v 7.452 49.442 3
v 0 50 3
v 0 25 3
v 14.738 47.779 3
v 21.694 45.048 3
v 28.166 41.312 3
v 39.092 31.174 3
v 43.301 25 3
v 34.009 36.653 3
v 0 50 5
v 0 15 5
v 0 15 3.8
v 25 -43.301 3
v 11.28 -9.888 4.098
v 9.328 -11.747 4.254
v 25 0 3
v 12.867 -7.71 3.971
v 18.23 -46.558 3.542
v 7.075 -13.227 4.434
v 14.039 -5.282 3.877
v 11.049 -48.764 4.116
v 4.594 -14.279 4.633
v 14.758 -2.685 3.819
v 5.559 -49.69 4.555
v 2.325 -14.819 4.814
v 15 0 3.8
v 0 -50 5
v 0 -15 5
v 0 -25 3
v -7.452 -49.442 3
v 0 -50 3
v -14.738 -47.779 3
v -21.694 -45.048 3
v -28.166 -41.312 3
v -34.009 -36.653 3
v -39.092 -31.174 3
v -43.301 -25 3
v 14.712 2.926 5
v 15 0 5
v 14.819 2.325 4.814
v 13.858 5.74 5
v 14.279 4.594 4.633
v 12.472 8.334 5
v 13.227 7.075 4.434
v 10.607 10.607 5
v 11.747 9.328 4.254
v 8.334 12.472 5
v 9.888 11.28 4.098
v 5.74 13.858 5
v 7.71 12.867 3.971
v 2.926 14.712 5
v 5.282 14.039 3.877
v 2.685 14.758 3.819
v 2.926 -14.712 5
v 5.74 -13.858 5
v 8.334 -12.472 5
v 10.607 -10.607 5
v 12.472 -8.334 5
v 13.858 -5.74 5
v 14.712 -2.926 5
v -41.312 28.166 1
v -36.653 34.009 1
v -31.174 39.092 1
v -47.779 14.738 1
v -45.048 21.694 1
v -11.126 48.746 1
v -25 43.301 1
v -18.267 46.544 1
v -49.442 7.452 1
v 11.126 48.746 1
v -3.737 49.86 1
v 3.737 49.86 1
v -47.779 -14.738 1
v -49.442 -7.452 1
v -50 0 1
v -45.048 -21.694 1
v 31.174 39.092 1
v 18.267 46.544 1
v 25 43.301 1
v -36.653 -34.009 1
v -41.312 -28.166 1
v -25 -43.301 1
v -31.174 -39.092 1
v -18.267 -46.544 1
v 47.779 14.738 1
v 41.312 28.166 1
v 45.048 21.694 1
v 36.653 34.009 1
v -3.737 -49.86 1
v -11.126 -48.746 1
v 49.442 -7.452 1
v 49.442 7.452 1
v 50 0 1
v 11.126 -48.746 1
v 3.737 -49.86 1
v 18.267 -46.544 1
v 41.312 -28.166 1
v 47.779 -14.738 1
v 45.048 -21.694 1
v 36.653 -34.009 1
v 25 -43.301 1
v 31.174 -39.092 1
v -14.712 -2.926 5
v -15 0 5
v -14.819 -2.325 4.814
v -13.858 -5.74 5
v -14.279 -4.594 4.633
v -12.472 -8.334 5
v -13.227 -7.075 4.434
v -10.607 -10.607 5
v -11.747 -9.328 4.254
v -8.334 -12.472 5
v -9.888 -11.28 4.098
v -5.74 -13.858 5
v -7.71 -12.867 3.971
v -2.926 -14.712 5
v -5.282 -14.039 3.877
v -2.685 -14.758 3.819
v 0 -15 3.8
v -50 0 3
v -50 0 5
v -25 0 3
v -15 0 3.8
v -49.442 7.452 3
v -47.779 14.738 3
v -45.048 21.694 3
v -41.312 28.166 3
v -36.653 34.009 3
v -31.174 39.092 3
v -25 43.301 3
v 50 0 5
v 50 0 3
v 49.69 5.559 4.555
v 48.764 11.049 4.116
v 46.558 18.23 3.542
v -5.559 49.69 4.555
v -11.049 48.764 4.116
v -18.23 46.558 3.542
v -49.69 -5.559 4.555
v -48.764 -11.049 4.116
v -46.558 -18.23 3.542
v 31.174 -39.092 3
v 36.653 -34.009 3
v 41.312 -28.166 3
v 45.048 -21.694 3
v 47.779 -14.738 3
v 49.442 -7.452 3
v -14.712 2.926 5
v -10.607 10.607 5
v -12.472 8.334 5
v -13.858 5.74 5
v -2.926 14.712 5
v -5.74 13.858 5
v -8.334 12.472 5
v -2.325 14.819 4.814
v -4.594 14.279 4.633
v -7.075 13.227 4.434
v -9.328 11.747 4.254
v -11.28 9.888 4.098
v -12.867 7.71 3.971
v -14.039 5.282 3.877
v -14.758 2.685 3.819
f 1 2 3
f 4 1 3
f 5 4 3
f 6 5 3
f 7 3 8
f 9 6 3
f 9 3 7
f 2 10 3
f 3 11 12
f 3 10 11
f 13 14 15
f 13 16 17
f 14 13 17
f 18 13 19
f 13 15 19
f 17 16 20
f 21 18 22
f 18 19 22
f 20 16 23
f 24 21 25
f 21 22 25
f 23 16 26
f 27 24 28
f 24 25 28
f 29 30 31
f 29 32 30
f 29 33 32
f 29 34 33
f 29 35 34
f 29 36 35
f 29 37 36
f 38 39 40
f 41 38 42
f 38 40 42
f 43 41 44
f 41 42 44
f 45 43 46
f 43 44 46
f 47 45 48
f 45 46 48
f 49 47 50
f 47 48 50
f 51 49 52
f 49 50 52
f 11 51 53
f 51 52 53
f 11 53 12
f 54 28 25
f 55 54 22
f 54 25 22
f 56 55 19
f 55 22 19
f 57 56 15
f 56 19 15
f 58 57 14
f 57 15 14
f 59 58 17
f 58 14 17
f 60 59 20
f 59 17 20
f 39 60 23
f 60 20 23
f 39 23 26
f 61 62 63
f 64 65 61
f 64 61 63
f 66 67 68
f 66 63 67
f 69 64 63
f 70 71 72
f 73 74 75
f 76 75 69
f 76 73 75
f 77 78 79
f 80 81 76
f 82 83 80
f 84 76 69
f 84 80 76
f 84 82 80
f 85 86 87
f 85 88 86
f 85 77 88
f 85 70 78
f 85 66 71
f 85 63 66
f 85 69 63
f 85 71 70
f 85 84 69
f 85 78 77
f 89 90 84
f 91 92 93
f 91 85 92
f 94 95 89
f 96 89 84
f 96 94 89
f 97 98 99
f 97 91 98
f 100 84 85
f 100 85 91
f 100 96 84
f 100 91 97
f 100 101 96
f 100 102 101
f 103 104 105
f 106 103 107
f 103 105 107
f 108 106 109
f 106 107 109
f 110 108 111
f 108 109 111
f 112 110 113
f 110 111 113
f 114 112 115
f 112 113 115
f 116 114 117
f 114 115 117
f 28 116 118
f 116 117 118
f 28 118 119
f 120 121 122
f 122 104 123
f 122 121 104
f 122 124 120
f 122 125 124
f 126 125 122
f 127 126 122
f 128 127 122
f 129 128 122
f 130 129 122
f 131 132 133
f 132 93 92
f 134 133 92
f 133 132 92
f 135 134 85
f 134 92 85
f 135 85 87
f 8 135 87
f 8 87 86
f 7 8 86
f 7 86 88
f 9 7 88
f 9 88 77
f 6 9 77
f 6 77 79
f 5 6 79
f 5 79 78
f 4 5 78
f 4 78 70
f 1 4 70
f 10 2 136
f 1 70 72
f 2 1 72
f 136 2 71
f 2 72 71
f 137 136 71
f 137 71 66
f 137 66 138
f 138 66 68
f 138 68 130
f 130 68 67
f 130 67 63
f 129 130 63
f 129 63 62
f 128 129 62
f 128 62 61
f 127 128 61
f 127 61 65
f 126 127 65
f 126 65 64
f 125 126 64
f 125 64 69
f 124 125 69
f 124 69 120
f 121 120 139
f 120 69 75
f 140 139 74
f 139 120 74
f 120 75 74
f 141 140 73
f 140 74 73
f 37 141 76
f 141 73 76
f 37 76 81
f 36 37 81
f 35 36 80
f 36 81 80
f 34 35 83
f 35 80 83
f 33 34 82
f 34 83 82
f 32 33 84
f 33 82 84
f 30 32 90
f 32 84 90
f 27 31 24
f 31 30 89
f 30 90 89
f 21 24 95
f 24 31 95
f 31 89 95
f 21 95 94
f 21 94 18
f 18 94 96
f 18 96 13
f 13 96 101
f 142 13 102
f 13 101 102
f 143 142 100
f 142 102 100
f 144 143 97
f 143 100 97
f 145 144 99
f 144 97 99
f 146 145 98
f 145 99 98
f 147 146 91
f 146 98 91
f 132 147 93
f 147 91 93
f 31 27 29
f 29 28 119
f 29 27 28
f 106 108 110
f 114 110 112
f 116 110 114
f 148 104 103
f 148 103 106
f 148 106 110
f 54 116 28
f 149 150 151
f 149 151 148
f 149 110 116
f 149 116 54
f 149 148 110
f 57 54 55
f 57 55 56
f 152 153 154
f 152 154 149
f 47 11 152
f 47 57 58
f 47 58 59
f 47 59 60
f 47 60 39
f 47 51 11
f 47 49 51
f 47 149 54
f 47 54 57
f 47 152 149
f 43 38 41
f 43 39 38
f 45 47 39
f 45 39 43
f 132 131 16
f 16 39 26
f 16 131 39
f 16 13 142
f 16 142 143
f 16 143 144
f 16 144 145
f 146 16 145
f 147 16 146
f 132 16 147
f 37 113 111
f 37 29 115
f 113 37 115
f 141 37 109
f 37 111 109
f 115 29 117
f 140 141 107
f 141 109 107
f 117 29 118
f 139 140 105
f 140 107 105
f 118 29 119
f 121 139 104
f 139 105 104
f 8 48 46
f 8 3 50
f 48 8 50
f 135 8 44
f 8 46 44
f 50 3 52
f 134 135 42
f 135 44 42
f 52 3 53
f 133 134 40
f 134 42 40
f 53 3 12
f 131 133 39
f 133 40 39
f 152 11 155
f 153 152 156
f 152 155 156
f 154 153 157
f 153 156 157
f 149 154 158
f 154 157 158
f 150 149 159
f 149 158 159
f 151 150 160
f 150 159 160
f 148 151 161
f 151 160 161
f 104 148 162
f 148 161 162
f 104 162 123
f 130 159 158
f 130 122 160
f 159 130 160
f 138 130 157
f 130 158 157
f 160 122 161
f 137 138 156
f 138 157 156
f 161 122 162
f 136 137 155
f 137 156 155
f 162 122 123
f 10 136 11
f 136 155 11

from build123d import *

# Parameters (mm, degrees)
F0_R          = 50
F0_R_2        = 15
F1_DEPTH      = 3
F2_DEPTH      = 5
F4_DEPTH      = 50
F5_COUNT      = 4
F6_R          = 62.5
F6_R_2        = 50
F7_DEPTH      = 25
F8_W          = 200
F8_H          = 2
F9_DEPTH      = 100
F9_DEPTH_BACK = 100


with BuildPart() as f1:
    # F0 (on Top) → F1 (new body)
    with BuildSketch(Plane.XY):
        Circle(F0_R)
        Circle(F0_R_2, mode=Mode.SUBTRACT)
    extrude(amount=F1_DEPTH)

    # F0 (on Top) → F2 (join)
    with BuildSketch(Plane.XY):
        Circle(F0_R_2)
    extrude(amount=F2_DEPTH)

    # F3 (on Front) → F4 (join)
    with BuildSketch(Plane.XZ):
        Polygon((0, 5), (0, 3), (25, 3), align=None)
    extrude(amount=F4_DEPTH)

    # F5: F1 ×4 about axis
    f5_axis = Axis((0, 0, 3), (0, 0, 1))


with BuildPart() as f1_1:
    add(f1.part)
    for i in range(1, F5_COUNT):
        add(f1.part.rotate(f5_axis, i * 360 / F5_COUNT))

    # F6 (on Top) → F7 (cut)
    with BuildSketch(Plane.XY):
        Circle(F6_R)
        Circle(F6_R_2, mode=Mode.SUBTRACT)
    extrude(amount=F7_DEPTH, mode=Mode.SUBTRACT)

    # F8 (on Front) → F9 (cut, two sides)
    with BuildSketch(Plane.XZ) as f9_sk:
        Rectangle(F8_W, F8_H)
    extrude(amount=-F9_DEPTH, mode=Mode.SUBTRACT)
    extrude(f9_sk.sketch, amount=F9_DEPTH_BACK, mode=Mode.SUBTRACT)


solid = f1_1.part
